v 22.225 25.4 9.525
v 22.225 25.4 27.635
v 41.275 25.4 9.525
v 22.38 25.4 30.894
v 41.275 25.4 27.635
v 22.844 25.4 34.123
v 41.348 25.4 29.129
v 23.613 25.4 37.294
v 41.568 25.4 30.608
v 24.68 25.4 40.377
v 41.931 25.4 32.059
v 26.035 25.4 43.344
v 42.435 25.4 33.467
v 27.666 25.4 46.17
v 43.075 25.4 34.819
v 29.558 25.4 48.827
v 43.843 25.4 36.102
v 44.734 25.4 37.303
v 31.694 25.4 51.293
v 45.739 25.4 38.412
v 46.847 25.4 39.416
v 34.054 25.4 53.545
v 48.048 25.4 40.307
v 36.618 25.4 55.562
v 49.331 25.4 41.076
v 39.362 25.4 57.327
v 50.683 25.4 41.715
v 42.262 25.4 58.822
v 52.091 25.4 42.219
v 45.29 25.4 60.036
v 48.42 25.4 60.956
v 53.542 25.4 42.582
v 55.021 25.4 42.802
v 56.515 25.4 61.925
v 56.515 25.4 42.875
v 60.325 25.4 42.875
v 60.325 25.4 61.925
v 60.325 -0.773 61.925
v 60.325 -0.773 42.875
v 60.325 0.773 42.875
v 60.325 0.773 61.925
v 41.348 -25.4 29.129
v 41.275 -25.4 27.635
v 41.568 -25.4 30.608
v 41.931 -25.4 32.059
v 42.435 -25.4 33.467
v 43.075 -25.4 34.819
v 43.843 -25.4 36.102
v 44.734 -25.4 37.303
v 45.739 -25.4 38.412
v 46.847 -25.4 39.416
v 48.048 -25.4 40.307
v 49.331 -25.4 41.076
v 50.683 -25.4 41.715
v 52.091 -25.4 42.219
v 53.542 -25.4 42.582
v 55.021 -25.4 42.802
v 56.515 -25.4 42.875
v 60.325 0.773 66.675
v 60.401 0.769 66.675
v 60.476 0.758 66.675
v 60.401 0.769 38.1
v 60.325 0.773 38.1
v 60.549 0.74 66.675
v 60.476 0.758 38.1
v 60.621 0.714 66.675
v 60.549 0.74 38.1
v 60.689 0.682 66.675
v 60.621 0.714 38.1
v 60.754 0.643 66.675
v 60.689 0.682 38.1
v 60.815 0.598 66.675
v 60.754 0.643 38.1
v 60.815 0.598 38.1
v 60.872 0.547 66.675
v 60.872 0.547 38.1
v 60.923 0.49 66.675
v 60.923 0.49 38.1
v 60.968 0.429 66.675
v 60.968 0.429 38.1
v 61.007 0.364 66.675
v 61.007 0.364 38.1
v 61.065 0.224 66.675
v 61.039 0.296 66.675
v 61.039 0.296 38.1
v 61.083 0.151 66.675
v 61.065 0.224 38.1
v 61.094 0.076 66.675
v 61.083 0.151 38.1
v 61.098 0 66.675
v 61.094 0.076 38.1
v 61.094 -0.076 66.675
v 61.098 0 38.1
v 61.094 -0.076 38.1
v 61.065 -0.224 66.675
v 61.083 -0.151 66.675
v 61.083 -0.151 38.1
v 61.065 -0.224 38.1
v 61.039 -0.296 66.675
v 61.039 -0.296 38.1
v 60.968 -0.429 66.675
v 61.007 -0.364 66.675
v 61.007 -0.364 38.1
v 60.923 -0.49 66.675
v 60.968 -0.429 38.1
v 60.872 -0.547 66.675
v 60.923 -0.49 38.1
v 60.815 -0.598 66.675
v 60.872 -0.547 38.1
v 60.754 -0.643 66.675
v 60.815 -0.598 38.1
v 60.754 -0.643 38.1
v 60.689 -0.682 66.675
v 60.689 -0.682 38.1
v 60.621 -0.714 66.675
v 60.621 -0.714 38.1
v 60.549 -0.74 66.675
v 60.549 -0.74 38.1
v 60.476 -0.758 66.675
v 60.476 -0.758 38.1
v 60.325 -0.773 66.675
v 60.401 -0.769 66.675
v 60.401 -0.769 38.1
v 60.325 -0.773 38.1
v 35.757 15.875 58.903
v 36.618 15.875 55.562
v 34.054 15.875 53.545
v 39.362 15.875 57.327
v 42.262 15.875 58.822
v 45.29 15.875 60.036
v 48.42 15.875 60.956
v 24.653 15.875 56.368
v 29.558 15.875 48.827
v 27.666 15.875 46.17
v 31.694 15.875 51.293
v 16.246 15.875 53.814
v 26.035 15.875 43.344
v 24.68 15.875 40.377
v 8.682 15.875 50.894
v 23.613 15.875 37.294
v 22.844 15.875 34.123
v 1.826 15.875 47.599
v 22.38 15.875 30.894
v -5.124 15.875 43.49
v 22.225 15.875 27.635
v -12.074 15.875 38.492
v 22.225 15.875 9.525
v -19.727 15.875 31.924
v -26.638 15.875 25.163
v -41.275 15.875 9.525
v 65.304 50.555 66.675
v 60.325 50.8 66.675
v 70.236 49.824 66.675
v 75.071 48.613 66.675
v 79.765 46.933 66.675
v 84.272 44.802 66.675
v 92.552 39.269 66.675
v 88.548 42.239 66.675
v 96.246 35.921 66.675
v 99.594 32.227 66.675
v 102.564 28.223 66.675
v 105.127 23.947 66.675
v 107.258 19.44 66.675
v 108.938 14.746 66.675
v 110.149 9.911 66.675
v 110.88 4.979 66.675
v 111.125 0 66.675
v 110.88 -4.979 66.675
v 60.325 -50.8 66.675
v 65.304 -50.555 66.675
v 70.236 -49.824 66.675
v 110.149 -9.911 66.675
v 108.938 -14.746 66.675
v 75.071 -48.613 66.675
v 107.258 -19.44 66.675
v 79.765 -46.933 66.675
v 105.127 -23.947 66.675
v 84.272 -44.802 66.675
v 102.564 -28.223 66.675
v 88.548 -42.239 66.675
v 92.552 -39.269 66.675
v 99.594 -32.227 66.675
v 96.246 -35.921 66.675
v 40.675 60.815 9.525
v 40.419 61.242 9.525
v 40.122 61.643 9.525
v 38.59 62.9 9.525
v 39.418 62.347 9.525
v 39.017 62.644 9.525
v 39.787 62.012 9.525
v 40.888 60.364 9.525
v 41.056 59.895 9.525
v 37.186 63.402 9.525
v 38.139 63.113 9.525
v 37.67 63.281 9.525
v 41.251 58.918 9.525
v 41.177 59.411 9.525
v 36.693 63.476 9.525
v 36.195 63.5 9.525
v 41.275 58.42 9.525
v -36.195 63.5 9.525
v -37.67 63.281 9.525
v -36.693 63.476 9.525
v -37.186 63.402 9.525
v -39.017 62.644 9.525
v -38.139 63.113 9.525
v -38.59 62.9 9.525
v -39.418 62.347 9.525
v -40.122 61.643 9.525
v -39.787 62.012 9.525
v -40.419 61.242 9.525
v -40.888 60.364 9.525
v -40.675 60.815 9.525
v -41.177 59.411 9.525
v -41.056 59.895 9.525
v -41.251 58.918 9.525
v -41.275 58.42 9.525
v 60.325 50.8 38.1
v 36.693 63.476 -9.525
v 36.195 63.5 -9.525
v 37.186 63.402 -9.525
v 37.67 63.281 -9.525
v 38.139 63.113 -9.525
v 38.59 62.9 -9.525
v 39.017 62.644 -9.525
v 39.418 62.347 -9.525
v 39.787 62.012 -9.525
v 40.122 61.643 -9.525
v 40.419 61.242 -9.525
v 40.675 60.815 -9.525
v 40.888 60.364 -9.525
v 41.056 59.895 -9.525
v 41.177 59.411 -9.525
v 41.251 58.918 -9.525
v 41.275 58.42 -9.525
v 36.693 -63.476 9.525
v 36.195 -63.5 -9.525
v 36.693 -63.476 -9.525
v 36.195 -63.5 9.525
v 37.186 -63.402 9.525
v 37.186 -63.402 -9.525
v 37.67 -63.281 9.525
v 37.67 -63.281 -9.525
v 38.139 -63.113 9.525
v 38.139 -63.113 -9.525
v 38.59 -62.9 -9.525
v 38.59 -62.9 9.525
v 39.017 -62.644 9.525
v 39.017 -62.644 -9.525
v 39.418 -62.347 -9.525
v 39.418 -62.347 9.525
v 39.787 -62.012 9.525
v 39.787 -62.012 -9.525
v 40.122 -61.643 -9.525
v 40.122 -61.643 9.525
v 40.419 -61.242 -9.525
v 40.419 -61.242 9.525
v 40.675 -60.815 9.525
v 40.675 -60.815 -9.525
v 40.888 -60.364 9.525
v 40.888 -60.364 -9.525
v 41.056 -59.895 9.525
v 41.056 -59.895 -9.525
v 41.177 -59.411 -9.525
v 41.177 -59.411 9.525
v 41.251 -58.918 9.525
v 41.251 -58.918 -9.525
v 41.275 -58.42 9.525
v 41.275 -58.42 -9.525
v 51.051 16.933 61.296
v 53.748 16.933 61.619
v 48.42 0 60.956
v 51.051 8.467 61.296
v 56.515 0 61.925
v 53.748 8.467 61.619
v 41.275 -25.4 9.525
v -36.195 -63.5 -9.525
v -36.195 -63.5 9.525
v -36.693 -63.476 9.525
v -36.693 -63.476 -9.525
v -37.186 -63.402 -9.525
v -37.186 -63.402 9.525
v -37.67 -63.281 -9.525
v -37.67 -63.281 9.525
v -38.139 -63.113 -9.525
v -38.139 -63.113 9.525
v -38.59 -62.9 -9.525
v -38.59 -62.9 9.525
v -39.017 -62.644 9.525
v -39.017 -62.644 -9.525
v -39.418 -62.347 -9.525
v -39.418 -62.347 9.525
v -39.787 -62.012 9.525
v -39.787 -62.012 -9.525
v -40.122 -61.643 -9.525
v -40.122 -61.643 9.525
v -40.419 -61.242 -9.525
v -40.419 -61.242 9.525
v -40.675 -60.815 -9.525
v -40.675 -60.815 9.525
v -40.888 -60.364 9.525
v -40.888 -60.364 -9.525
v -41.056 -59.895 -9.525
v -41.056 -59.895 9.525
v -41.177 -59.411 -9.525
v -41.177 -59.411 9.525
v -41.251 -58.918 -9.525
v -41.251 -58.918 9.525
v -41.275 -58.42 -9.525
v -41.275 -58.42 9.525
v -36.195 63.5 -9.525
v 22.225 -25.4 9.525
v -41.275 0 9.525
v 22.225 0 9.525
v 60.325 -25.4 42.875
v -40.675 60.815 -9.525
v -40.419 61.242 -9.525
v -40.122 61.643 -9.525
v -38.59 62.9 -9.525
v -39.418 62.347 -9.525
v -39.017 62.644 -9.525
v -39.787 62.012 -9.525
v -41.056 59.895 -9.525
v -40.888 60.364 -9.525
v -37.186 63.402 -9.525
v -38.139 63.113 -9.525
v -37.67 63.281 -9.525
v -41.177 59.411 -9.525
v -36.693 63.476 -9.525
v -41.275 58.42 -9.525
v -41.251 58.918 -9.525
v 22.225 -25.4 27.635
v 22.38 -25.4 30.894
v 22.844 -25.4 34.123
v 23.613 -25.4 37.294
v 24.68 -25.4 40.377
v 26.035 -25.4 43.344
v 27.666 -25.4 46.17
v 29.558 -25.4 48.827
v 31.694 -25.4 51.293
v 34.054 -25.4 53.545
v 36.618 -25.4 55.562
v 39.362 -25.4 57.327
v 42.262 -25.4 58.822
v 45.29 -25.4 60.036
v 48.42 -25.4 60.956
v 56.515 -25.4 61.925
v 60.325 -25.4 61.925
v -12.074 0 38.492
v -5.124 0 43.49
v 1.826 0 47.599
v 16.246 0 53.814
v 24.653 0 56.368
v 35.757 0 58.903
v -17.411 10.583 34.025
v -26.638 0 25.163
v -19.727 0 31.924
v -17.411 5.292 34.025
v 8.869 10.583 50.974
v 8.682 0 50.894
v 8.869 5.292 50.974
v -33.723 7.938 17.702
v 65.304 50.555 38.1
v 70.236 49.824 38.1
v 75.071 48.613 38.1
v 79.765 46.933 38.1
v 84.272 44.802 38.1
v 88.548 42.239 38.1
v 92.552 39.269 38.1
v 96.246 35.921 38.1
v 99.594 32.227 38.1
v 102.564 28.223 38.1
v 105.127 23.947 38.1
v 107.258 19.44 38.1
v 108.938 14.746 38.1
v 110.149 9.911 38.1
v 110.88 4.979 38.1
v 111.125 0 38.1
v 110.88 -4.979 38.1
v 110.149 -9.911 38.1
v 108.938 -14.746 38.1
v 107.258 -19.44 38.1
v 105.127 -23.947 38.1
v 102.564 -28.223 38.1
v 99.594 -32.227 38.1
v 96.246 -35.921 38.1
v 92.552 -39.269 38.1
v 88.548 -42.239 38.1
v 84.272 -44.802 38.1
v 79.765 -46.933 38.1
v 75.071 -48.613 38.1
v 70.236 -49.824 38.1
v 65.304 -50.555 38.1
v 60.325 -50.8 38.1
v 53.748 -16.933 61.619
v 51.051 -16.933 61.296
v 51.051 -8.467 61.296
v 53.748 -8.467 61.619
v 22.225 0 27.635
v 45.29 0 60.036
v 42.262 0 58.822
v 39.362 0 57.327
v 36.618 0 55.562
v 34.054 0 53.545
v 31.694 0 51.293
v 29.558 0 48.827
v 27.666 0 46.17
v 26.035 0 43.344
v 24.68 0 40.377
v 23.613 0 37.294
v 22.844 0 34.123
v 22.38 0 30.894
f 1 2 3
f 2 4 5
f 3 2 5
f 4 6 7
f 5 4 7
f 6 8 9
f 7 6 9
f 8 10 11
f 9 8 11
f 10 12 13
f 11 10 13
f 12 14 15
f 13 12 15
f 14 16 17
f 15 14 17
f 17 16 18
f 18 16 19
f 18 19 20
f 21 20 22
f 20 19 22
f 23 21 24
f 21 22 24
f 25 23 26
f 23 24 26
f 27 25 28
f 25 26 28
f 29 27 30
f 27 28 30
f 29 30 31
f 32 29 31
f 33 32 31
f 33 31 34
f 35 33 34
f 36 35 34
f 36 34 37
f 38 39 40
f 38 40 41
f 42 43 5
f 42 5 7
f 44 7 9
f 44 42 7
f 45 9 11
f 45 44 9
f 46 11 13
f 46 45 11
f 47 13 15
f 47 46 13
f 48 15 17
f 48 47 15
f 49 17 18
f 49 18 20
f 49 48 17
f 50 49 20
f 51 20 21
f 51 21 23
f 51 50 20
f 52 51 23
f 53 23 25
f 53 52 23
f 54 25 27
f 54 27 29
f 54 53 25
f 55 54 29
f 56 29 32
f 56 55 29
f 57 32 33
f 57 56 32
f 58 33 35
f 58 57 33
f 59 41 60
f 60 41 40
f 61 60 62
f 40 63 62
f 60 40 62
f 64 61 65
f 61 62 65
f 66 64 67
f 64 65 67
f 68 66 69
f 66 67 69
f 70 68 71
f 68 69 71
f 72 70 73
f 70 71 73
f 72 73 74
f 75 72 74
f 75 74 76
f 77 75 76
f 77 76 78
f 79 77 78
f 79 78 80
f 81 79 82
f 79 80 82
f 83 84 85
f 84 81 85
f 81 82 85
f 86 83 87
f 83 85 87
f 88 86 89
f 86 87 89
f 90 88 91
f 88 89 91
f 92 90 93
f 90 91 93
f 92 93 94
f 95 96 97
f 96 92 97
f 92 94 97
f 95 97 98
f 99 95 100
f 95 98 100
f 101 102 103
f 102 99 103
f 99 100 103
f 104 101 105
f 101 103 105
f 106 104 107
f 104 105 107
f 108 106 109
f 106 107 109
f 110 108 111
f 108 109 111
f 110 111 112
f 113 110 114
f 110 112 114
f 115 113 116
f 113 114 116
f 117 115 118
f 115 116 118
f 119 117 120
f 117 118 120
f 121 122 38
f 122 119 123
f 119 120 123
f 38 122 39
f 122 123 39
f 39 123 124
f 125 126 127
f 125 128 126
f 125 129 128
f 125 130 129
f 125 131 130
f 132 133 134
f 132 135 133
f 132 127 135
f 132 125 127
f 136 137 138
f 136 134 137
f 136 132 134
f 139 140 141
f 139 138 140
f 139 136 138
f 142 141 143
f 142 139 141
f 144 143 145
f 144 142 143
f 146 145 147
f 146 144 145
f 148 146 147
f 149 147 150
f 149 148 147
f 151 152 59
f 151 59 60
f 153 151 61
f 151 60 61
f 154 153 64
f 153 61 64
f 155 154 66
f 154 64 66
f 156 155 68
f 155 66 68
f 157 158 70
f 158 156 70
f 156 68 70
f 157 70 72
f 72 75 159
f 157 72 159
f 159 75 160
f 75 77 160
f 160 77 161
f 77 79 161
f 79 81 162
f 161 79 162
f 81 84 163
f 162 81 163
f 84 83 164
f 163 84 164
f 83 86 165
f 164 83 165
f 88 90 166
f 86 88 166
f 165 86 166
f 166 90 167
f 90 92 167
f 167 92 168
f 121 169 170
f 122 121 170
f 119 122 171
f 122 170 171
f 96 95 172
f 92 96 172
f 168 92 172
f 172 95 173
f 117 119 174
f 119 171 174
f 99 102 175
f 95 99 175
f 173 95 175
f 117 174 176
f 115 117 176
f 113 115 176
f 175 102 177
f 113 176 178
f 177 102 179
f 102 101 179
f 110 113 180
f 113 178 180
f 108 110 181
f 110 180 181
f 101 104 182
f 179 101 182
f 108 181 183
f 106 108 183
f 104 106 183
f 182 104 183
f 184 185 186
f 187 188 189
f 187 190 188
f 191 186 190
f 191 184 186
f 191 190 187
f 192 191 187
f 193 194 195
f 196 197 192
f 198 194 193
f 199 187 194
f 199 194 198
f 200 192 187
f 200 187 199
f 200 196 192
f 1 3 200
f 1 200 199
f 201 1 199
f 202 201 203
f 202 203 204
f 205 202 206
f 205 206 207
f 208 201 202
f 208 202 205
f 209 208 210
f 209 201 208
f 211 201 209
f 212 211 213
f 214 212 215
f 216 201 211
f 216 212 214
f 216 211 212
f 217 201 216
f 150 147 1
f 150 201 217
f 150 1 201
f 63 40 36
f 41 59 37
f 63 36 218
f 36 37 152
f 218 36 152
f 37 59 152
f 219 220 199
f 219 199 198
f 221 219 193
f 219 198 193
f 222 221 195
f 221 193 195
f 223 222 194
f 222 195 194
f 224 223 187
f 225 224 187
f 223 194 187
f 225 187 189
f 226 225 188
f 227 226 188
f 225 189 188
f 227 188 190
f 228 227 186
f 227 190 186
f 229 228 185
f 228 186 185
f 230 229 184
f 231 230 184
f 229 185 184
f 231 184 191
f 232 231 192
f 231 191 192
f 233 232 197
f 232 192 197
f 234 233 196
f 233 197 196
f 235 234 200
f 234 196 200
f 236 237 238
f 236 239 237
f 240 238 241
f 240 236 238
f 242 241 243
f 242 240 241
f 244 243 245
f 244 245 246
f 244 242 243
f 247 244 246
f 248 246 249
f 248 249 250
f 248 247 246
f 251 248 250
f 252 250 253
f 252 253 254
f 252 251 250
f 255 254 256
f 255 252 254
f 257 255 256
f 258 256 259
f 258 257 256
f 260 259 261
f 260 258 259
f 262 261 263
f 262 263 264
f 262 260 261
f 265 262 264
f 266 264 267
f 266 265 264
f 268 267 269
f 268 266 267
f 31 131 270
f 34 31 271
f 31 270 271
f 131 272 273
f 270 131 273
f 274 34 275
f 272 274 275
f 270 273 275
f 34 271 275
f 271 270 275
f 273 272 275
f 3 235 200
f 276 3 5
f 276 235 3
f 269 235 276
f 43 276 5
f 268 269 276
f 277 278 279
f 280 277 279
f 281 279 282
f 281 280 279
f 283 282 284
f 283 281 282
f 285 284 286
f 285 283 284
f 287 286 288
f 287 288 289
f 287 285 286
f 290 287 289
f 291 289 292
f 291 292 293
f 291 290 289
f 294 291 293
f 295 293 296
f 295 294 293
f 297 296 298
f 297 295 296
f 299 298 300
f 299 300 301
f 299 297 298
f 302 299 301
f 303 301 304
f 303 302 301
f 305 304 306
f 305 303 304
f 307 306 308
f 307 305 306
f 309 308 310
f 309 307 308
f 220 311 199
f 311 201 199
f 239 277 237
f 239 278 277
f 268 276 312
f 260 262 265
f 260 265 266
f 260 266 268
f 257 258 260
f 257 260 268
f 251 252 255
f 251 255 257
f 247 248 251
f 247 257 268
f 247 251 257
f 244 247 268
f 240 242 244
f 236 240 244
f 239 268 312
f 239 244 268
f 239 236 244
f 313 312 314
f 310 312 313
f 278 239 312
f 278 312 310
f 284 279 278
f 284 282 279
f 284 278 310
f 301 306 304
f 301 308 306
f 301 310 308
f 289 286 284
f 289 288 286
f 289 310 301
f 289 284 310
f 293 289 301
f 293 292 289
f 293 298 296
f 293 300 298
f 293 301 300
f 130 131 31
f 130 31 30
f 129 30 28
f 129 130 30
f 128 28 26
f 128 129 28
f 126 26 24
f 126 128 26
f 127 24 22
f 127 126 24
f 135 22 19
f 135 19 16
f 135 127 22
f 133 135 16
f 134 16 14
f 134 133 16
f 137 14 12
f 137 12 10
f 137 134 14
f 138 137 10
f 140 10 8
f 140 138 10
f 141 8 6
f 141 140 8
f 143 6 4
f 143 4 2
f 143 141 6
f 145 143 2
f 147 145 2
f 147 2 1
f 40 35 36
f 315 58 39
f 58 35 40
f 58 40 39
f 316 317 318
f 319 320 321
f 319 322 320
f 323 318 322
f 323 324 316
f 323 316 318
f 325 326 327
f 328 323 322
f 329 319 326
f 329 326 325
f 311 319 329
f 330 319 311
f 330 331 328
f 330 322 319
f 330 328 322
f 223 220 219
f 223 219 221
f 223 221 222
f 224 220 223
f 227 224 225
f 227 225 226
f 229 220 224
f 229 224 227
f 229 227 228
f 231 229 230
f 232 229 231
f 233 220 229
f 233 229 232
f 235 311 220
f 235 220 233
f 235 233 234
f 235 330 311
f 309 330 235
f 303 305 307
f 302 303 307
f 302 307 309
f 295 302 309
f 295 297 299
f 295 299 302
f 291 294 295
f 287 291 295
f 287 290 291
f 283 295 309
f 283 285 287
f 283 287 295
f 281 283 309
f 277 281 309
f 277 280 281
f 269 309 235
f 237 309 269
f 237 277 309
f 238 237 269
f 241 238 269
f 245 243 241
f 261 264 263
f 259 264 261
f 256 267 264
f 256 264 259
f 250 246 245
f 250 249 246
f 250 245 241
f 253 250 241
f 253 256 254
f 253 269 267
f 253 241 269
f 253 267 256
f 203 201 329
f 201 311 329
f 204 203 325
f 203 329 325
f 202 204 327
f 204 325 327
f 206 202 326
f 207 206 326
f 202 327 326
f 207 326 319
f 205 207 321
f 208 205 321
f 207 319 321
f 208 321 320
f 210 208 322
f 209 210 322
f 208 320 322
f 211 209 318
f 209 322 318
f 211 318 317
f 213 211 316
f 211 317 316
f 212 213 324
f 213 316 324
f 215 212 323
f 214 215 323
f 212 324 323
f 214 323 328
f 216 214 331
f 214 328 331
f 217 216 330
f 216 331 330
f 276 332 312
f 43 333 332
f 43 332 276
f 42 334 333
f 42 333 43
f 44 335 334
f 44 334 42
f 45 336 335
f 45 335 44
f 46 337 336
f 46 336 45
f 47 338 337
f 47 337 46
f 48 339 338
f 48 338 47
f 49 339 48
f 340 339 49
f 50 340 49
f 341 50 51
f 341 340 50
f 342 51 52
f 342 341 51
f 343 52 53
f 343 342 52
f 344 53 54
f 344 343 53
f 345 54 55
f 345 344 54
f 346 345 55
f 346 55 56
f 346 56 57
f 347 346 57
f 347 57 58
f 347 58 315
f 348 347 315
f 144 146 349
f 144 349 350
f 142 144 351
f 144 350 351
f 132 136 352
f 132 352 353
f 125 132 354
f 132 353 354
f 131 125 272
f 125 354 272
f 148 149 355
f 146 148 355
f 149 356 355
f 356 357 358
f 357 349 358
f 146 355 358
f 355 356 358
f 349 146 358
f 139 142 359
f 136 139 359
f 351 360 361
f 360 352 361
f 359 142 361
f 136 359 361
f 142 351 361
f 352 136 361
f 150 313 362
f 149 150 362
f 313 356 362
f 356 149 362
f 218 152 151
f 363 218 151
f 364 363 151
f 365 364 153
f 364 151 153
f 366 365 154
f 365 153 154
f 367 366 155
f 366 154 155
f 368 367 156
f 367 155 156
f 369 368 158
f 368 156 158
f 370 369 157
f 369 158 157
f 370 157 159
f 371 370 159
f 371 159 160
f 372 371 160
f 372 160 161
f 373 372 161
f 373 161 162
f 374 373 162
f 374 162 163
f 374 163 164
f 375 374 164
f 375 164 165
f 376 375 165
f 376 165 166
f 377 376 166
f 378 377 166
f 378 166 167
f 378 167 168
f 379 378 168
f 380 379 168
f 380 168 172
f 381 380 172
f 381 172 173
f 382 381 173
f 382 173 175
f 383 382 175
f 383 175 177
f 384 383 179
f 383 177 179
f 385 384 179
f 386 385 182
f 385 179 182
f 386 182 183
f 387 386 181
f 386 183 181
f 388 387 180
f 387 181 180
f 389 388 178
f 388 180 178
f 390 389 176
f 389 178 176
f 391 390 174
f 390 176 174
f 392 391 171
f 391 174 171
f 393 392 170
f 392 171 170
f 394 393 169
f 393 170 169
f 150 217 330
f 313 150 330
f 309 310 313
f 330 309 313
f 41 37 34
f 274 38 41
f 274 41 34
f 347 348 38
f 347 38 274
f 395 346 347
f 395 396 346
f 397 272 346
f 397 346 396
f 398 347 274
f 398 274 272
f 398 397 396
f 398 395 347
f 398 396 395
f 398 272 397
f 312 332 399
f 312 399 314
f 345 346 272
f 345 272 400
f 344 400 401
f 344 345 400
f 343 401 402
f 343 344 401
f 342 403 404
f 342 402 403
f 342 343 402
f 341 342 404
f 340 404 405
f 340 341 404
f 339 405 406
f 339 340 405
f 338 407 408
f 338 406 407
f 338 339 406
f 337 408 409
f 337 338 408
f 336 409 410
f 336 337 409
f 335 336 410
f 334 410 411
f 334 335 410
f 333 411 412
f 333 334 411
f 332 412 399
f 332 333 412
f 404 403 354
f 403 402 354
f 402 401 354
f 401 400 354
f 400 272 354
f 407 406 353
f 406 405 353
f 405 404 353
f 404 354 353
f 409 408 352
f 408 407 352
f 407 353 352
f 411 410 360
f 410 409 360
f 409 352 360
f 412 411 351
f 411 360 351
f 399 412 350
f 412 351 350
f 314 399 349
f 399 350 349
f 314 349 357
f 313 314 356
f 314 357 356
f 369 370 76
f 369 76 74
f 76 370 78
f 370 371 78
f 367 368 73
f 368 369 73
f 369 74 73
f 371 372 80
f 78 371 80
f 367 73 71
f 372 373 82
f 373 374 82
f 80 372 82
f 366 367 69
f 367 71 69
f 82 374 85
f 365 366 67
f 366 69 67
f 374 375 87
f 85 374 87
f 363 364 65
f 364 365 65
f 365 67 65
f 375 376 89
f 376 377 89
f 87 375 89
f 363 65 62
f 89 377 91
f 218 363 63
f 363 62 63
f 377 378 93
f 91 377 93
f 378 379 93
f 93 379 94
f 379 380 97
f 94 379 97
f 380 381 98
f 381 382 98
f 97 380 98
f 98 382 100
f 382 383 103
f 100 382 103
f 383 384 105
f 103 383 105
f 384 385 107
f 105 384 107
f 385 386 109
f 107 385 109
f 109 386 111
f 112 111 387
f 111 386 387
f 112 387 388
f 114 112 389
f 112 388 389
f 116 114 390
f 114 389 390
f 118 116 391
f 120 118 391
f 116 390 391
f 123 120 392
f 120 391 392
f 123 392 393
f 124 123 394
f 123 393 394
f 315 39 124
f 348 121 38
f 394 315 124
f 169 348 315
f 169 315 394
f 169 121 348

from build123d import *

# Parameters (mm, degrees)
F1_DEPTH = 63.5
F2_DEPTH = 25.4
F3_DEPTH = 15.875
F4_ANGLE = 180
F5_R     = 5.08


with BuildPart() as f1:
    # F0 (on Front) → F1 (new body, symmetric)
    with BuildSketch(Plane.XZ):
        Polygon((22.225, 9.525), (-41.275, 9.525), (-41.275, -9.525), (41.275, -9.525), (41.275, 9.525), align=None)
    extrude(amount=F1_DEPTH, both=True)

    # F0 (on Front) → F2 (join, symmetric)
    with BuildSketch(Plane.XZ):
        with BuildLine():
            Line((22.225, 27.6352), (22.225, 9.525))
            Line((22.225, 9.525), (41.275, 9.525))
            Line((41.275, 9.525), (41.275, 27.6352))
            ThreePointArc((41.275, 27.6352), (45.738693, 38.411507), (56.515, 42.8752))
            Line((56.515, 42.8752), (60.325, 42.8752))
            Line((60.325, 42.8752), (60.325, 61.9252))
            Line((60.325, 61.9252), (56.515, 61.9252))
            add(Edge.make_bspline(
                [(48.419926, 60.955972), (51.017529, 61.304979), (53.713576, 61.627931), (56.515, 61.9252)],
                knots=[105.444957, 105.444957, 105.444957, 105.444957, 110.944423, 110.944423, 110.944423, 110.944423], degree=3))
            ThreePointArc((48.419926, 60.955972), (29.557773, 48.827463), (22.225, 27.6352))
        make_face()
    extrude(amount=F2_DEPTH, both=True)

    # F0 (on Front) → F3 (join)
    with BuildSketch(Plane.XZ):
        with BuildLine():
            add(Edge.make_bspline(
                [(-41.275, 9.525), (-14.999935, 37.993934), (-1.385662, 54.264229), (48.419926, 60.955972)],
                knots=[0, 0, 0, 0, 105.444957, 105.444957, 105.444957, 105.444957], degree=3))
            Line((-41.275, 9.525), (22.225, 9.525))
            Line((22.225, 9.525), (22.225, 27.6352))
            ThreePointArc((22.225, 27.6352), (29.557773, 48.827463), (48.419926, 60.955972))
        make_face()
    extrude(amount=-F3_DEPTH)

    # F0 (on Front) → F4 (revolve, symmetric)
    with BuildSketch(Plane.XZ) as f4_sk:
        Polygon((61.098028, 66.675), (61.098028, 61.9252), (75.06405, 61.9252), (75.06405, 38.1), (111.125, 38.1), (111.125, 66.675), align=None)
        Polygon((75.06405, 61.9252), (61.098028, 61.9252), (61.098028, 42.8752), (61.098028, 38.1), (75.06405, 38.1), align=None)
    revolve(axis=Axis((60.325, 0, 52.3875), (0, 0, 1)), revolution_arc=F4_ANGLE / 2)
    revolve(f4_sk.sketch, axis=Axis((60.325, 0, 52.3875), (0, 0, -1)), revolution_arc=F4_ANGLE / 2)

    # F5
    f5_edges = [f1.edges().sort_by_distance(p)[0] for p in [
        (41.275, -63.5, 0),
        (-41.275, -63.5, 0),
        (-41.275, 63.5, 0),
        (41.275, 63.5, 0),
    ]]
    fillet(f5_edges, radius=F5_R)


solid = f1.part
